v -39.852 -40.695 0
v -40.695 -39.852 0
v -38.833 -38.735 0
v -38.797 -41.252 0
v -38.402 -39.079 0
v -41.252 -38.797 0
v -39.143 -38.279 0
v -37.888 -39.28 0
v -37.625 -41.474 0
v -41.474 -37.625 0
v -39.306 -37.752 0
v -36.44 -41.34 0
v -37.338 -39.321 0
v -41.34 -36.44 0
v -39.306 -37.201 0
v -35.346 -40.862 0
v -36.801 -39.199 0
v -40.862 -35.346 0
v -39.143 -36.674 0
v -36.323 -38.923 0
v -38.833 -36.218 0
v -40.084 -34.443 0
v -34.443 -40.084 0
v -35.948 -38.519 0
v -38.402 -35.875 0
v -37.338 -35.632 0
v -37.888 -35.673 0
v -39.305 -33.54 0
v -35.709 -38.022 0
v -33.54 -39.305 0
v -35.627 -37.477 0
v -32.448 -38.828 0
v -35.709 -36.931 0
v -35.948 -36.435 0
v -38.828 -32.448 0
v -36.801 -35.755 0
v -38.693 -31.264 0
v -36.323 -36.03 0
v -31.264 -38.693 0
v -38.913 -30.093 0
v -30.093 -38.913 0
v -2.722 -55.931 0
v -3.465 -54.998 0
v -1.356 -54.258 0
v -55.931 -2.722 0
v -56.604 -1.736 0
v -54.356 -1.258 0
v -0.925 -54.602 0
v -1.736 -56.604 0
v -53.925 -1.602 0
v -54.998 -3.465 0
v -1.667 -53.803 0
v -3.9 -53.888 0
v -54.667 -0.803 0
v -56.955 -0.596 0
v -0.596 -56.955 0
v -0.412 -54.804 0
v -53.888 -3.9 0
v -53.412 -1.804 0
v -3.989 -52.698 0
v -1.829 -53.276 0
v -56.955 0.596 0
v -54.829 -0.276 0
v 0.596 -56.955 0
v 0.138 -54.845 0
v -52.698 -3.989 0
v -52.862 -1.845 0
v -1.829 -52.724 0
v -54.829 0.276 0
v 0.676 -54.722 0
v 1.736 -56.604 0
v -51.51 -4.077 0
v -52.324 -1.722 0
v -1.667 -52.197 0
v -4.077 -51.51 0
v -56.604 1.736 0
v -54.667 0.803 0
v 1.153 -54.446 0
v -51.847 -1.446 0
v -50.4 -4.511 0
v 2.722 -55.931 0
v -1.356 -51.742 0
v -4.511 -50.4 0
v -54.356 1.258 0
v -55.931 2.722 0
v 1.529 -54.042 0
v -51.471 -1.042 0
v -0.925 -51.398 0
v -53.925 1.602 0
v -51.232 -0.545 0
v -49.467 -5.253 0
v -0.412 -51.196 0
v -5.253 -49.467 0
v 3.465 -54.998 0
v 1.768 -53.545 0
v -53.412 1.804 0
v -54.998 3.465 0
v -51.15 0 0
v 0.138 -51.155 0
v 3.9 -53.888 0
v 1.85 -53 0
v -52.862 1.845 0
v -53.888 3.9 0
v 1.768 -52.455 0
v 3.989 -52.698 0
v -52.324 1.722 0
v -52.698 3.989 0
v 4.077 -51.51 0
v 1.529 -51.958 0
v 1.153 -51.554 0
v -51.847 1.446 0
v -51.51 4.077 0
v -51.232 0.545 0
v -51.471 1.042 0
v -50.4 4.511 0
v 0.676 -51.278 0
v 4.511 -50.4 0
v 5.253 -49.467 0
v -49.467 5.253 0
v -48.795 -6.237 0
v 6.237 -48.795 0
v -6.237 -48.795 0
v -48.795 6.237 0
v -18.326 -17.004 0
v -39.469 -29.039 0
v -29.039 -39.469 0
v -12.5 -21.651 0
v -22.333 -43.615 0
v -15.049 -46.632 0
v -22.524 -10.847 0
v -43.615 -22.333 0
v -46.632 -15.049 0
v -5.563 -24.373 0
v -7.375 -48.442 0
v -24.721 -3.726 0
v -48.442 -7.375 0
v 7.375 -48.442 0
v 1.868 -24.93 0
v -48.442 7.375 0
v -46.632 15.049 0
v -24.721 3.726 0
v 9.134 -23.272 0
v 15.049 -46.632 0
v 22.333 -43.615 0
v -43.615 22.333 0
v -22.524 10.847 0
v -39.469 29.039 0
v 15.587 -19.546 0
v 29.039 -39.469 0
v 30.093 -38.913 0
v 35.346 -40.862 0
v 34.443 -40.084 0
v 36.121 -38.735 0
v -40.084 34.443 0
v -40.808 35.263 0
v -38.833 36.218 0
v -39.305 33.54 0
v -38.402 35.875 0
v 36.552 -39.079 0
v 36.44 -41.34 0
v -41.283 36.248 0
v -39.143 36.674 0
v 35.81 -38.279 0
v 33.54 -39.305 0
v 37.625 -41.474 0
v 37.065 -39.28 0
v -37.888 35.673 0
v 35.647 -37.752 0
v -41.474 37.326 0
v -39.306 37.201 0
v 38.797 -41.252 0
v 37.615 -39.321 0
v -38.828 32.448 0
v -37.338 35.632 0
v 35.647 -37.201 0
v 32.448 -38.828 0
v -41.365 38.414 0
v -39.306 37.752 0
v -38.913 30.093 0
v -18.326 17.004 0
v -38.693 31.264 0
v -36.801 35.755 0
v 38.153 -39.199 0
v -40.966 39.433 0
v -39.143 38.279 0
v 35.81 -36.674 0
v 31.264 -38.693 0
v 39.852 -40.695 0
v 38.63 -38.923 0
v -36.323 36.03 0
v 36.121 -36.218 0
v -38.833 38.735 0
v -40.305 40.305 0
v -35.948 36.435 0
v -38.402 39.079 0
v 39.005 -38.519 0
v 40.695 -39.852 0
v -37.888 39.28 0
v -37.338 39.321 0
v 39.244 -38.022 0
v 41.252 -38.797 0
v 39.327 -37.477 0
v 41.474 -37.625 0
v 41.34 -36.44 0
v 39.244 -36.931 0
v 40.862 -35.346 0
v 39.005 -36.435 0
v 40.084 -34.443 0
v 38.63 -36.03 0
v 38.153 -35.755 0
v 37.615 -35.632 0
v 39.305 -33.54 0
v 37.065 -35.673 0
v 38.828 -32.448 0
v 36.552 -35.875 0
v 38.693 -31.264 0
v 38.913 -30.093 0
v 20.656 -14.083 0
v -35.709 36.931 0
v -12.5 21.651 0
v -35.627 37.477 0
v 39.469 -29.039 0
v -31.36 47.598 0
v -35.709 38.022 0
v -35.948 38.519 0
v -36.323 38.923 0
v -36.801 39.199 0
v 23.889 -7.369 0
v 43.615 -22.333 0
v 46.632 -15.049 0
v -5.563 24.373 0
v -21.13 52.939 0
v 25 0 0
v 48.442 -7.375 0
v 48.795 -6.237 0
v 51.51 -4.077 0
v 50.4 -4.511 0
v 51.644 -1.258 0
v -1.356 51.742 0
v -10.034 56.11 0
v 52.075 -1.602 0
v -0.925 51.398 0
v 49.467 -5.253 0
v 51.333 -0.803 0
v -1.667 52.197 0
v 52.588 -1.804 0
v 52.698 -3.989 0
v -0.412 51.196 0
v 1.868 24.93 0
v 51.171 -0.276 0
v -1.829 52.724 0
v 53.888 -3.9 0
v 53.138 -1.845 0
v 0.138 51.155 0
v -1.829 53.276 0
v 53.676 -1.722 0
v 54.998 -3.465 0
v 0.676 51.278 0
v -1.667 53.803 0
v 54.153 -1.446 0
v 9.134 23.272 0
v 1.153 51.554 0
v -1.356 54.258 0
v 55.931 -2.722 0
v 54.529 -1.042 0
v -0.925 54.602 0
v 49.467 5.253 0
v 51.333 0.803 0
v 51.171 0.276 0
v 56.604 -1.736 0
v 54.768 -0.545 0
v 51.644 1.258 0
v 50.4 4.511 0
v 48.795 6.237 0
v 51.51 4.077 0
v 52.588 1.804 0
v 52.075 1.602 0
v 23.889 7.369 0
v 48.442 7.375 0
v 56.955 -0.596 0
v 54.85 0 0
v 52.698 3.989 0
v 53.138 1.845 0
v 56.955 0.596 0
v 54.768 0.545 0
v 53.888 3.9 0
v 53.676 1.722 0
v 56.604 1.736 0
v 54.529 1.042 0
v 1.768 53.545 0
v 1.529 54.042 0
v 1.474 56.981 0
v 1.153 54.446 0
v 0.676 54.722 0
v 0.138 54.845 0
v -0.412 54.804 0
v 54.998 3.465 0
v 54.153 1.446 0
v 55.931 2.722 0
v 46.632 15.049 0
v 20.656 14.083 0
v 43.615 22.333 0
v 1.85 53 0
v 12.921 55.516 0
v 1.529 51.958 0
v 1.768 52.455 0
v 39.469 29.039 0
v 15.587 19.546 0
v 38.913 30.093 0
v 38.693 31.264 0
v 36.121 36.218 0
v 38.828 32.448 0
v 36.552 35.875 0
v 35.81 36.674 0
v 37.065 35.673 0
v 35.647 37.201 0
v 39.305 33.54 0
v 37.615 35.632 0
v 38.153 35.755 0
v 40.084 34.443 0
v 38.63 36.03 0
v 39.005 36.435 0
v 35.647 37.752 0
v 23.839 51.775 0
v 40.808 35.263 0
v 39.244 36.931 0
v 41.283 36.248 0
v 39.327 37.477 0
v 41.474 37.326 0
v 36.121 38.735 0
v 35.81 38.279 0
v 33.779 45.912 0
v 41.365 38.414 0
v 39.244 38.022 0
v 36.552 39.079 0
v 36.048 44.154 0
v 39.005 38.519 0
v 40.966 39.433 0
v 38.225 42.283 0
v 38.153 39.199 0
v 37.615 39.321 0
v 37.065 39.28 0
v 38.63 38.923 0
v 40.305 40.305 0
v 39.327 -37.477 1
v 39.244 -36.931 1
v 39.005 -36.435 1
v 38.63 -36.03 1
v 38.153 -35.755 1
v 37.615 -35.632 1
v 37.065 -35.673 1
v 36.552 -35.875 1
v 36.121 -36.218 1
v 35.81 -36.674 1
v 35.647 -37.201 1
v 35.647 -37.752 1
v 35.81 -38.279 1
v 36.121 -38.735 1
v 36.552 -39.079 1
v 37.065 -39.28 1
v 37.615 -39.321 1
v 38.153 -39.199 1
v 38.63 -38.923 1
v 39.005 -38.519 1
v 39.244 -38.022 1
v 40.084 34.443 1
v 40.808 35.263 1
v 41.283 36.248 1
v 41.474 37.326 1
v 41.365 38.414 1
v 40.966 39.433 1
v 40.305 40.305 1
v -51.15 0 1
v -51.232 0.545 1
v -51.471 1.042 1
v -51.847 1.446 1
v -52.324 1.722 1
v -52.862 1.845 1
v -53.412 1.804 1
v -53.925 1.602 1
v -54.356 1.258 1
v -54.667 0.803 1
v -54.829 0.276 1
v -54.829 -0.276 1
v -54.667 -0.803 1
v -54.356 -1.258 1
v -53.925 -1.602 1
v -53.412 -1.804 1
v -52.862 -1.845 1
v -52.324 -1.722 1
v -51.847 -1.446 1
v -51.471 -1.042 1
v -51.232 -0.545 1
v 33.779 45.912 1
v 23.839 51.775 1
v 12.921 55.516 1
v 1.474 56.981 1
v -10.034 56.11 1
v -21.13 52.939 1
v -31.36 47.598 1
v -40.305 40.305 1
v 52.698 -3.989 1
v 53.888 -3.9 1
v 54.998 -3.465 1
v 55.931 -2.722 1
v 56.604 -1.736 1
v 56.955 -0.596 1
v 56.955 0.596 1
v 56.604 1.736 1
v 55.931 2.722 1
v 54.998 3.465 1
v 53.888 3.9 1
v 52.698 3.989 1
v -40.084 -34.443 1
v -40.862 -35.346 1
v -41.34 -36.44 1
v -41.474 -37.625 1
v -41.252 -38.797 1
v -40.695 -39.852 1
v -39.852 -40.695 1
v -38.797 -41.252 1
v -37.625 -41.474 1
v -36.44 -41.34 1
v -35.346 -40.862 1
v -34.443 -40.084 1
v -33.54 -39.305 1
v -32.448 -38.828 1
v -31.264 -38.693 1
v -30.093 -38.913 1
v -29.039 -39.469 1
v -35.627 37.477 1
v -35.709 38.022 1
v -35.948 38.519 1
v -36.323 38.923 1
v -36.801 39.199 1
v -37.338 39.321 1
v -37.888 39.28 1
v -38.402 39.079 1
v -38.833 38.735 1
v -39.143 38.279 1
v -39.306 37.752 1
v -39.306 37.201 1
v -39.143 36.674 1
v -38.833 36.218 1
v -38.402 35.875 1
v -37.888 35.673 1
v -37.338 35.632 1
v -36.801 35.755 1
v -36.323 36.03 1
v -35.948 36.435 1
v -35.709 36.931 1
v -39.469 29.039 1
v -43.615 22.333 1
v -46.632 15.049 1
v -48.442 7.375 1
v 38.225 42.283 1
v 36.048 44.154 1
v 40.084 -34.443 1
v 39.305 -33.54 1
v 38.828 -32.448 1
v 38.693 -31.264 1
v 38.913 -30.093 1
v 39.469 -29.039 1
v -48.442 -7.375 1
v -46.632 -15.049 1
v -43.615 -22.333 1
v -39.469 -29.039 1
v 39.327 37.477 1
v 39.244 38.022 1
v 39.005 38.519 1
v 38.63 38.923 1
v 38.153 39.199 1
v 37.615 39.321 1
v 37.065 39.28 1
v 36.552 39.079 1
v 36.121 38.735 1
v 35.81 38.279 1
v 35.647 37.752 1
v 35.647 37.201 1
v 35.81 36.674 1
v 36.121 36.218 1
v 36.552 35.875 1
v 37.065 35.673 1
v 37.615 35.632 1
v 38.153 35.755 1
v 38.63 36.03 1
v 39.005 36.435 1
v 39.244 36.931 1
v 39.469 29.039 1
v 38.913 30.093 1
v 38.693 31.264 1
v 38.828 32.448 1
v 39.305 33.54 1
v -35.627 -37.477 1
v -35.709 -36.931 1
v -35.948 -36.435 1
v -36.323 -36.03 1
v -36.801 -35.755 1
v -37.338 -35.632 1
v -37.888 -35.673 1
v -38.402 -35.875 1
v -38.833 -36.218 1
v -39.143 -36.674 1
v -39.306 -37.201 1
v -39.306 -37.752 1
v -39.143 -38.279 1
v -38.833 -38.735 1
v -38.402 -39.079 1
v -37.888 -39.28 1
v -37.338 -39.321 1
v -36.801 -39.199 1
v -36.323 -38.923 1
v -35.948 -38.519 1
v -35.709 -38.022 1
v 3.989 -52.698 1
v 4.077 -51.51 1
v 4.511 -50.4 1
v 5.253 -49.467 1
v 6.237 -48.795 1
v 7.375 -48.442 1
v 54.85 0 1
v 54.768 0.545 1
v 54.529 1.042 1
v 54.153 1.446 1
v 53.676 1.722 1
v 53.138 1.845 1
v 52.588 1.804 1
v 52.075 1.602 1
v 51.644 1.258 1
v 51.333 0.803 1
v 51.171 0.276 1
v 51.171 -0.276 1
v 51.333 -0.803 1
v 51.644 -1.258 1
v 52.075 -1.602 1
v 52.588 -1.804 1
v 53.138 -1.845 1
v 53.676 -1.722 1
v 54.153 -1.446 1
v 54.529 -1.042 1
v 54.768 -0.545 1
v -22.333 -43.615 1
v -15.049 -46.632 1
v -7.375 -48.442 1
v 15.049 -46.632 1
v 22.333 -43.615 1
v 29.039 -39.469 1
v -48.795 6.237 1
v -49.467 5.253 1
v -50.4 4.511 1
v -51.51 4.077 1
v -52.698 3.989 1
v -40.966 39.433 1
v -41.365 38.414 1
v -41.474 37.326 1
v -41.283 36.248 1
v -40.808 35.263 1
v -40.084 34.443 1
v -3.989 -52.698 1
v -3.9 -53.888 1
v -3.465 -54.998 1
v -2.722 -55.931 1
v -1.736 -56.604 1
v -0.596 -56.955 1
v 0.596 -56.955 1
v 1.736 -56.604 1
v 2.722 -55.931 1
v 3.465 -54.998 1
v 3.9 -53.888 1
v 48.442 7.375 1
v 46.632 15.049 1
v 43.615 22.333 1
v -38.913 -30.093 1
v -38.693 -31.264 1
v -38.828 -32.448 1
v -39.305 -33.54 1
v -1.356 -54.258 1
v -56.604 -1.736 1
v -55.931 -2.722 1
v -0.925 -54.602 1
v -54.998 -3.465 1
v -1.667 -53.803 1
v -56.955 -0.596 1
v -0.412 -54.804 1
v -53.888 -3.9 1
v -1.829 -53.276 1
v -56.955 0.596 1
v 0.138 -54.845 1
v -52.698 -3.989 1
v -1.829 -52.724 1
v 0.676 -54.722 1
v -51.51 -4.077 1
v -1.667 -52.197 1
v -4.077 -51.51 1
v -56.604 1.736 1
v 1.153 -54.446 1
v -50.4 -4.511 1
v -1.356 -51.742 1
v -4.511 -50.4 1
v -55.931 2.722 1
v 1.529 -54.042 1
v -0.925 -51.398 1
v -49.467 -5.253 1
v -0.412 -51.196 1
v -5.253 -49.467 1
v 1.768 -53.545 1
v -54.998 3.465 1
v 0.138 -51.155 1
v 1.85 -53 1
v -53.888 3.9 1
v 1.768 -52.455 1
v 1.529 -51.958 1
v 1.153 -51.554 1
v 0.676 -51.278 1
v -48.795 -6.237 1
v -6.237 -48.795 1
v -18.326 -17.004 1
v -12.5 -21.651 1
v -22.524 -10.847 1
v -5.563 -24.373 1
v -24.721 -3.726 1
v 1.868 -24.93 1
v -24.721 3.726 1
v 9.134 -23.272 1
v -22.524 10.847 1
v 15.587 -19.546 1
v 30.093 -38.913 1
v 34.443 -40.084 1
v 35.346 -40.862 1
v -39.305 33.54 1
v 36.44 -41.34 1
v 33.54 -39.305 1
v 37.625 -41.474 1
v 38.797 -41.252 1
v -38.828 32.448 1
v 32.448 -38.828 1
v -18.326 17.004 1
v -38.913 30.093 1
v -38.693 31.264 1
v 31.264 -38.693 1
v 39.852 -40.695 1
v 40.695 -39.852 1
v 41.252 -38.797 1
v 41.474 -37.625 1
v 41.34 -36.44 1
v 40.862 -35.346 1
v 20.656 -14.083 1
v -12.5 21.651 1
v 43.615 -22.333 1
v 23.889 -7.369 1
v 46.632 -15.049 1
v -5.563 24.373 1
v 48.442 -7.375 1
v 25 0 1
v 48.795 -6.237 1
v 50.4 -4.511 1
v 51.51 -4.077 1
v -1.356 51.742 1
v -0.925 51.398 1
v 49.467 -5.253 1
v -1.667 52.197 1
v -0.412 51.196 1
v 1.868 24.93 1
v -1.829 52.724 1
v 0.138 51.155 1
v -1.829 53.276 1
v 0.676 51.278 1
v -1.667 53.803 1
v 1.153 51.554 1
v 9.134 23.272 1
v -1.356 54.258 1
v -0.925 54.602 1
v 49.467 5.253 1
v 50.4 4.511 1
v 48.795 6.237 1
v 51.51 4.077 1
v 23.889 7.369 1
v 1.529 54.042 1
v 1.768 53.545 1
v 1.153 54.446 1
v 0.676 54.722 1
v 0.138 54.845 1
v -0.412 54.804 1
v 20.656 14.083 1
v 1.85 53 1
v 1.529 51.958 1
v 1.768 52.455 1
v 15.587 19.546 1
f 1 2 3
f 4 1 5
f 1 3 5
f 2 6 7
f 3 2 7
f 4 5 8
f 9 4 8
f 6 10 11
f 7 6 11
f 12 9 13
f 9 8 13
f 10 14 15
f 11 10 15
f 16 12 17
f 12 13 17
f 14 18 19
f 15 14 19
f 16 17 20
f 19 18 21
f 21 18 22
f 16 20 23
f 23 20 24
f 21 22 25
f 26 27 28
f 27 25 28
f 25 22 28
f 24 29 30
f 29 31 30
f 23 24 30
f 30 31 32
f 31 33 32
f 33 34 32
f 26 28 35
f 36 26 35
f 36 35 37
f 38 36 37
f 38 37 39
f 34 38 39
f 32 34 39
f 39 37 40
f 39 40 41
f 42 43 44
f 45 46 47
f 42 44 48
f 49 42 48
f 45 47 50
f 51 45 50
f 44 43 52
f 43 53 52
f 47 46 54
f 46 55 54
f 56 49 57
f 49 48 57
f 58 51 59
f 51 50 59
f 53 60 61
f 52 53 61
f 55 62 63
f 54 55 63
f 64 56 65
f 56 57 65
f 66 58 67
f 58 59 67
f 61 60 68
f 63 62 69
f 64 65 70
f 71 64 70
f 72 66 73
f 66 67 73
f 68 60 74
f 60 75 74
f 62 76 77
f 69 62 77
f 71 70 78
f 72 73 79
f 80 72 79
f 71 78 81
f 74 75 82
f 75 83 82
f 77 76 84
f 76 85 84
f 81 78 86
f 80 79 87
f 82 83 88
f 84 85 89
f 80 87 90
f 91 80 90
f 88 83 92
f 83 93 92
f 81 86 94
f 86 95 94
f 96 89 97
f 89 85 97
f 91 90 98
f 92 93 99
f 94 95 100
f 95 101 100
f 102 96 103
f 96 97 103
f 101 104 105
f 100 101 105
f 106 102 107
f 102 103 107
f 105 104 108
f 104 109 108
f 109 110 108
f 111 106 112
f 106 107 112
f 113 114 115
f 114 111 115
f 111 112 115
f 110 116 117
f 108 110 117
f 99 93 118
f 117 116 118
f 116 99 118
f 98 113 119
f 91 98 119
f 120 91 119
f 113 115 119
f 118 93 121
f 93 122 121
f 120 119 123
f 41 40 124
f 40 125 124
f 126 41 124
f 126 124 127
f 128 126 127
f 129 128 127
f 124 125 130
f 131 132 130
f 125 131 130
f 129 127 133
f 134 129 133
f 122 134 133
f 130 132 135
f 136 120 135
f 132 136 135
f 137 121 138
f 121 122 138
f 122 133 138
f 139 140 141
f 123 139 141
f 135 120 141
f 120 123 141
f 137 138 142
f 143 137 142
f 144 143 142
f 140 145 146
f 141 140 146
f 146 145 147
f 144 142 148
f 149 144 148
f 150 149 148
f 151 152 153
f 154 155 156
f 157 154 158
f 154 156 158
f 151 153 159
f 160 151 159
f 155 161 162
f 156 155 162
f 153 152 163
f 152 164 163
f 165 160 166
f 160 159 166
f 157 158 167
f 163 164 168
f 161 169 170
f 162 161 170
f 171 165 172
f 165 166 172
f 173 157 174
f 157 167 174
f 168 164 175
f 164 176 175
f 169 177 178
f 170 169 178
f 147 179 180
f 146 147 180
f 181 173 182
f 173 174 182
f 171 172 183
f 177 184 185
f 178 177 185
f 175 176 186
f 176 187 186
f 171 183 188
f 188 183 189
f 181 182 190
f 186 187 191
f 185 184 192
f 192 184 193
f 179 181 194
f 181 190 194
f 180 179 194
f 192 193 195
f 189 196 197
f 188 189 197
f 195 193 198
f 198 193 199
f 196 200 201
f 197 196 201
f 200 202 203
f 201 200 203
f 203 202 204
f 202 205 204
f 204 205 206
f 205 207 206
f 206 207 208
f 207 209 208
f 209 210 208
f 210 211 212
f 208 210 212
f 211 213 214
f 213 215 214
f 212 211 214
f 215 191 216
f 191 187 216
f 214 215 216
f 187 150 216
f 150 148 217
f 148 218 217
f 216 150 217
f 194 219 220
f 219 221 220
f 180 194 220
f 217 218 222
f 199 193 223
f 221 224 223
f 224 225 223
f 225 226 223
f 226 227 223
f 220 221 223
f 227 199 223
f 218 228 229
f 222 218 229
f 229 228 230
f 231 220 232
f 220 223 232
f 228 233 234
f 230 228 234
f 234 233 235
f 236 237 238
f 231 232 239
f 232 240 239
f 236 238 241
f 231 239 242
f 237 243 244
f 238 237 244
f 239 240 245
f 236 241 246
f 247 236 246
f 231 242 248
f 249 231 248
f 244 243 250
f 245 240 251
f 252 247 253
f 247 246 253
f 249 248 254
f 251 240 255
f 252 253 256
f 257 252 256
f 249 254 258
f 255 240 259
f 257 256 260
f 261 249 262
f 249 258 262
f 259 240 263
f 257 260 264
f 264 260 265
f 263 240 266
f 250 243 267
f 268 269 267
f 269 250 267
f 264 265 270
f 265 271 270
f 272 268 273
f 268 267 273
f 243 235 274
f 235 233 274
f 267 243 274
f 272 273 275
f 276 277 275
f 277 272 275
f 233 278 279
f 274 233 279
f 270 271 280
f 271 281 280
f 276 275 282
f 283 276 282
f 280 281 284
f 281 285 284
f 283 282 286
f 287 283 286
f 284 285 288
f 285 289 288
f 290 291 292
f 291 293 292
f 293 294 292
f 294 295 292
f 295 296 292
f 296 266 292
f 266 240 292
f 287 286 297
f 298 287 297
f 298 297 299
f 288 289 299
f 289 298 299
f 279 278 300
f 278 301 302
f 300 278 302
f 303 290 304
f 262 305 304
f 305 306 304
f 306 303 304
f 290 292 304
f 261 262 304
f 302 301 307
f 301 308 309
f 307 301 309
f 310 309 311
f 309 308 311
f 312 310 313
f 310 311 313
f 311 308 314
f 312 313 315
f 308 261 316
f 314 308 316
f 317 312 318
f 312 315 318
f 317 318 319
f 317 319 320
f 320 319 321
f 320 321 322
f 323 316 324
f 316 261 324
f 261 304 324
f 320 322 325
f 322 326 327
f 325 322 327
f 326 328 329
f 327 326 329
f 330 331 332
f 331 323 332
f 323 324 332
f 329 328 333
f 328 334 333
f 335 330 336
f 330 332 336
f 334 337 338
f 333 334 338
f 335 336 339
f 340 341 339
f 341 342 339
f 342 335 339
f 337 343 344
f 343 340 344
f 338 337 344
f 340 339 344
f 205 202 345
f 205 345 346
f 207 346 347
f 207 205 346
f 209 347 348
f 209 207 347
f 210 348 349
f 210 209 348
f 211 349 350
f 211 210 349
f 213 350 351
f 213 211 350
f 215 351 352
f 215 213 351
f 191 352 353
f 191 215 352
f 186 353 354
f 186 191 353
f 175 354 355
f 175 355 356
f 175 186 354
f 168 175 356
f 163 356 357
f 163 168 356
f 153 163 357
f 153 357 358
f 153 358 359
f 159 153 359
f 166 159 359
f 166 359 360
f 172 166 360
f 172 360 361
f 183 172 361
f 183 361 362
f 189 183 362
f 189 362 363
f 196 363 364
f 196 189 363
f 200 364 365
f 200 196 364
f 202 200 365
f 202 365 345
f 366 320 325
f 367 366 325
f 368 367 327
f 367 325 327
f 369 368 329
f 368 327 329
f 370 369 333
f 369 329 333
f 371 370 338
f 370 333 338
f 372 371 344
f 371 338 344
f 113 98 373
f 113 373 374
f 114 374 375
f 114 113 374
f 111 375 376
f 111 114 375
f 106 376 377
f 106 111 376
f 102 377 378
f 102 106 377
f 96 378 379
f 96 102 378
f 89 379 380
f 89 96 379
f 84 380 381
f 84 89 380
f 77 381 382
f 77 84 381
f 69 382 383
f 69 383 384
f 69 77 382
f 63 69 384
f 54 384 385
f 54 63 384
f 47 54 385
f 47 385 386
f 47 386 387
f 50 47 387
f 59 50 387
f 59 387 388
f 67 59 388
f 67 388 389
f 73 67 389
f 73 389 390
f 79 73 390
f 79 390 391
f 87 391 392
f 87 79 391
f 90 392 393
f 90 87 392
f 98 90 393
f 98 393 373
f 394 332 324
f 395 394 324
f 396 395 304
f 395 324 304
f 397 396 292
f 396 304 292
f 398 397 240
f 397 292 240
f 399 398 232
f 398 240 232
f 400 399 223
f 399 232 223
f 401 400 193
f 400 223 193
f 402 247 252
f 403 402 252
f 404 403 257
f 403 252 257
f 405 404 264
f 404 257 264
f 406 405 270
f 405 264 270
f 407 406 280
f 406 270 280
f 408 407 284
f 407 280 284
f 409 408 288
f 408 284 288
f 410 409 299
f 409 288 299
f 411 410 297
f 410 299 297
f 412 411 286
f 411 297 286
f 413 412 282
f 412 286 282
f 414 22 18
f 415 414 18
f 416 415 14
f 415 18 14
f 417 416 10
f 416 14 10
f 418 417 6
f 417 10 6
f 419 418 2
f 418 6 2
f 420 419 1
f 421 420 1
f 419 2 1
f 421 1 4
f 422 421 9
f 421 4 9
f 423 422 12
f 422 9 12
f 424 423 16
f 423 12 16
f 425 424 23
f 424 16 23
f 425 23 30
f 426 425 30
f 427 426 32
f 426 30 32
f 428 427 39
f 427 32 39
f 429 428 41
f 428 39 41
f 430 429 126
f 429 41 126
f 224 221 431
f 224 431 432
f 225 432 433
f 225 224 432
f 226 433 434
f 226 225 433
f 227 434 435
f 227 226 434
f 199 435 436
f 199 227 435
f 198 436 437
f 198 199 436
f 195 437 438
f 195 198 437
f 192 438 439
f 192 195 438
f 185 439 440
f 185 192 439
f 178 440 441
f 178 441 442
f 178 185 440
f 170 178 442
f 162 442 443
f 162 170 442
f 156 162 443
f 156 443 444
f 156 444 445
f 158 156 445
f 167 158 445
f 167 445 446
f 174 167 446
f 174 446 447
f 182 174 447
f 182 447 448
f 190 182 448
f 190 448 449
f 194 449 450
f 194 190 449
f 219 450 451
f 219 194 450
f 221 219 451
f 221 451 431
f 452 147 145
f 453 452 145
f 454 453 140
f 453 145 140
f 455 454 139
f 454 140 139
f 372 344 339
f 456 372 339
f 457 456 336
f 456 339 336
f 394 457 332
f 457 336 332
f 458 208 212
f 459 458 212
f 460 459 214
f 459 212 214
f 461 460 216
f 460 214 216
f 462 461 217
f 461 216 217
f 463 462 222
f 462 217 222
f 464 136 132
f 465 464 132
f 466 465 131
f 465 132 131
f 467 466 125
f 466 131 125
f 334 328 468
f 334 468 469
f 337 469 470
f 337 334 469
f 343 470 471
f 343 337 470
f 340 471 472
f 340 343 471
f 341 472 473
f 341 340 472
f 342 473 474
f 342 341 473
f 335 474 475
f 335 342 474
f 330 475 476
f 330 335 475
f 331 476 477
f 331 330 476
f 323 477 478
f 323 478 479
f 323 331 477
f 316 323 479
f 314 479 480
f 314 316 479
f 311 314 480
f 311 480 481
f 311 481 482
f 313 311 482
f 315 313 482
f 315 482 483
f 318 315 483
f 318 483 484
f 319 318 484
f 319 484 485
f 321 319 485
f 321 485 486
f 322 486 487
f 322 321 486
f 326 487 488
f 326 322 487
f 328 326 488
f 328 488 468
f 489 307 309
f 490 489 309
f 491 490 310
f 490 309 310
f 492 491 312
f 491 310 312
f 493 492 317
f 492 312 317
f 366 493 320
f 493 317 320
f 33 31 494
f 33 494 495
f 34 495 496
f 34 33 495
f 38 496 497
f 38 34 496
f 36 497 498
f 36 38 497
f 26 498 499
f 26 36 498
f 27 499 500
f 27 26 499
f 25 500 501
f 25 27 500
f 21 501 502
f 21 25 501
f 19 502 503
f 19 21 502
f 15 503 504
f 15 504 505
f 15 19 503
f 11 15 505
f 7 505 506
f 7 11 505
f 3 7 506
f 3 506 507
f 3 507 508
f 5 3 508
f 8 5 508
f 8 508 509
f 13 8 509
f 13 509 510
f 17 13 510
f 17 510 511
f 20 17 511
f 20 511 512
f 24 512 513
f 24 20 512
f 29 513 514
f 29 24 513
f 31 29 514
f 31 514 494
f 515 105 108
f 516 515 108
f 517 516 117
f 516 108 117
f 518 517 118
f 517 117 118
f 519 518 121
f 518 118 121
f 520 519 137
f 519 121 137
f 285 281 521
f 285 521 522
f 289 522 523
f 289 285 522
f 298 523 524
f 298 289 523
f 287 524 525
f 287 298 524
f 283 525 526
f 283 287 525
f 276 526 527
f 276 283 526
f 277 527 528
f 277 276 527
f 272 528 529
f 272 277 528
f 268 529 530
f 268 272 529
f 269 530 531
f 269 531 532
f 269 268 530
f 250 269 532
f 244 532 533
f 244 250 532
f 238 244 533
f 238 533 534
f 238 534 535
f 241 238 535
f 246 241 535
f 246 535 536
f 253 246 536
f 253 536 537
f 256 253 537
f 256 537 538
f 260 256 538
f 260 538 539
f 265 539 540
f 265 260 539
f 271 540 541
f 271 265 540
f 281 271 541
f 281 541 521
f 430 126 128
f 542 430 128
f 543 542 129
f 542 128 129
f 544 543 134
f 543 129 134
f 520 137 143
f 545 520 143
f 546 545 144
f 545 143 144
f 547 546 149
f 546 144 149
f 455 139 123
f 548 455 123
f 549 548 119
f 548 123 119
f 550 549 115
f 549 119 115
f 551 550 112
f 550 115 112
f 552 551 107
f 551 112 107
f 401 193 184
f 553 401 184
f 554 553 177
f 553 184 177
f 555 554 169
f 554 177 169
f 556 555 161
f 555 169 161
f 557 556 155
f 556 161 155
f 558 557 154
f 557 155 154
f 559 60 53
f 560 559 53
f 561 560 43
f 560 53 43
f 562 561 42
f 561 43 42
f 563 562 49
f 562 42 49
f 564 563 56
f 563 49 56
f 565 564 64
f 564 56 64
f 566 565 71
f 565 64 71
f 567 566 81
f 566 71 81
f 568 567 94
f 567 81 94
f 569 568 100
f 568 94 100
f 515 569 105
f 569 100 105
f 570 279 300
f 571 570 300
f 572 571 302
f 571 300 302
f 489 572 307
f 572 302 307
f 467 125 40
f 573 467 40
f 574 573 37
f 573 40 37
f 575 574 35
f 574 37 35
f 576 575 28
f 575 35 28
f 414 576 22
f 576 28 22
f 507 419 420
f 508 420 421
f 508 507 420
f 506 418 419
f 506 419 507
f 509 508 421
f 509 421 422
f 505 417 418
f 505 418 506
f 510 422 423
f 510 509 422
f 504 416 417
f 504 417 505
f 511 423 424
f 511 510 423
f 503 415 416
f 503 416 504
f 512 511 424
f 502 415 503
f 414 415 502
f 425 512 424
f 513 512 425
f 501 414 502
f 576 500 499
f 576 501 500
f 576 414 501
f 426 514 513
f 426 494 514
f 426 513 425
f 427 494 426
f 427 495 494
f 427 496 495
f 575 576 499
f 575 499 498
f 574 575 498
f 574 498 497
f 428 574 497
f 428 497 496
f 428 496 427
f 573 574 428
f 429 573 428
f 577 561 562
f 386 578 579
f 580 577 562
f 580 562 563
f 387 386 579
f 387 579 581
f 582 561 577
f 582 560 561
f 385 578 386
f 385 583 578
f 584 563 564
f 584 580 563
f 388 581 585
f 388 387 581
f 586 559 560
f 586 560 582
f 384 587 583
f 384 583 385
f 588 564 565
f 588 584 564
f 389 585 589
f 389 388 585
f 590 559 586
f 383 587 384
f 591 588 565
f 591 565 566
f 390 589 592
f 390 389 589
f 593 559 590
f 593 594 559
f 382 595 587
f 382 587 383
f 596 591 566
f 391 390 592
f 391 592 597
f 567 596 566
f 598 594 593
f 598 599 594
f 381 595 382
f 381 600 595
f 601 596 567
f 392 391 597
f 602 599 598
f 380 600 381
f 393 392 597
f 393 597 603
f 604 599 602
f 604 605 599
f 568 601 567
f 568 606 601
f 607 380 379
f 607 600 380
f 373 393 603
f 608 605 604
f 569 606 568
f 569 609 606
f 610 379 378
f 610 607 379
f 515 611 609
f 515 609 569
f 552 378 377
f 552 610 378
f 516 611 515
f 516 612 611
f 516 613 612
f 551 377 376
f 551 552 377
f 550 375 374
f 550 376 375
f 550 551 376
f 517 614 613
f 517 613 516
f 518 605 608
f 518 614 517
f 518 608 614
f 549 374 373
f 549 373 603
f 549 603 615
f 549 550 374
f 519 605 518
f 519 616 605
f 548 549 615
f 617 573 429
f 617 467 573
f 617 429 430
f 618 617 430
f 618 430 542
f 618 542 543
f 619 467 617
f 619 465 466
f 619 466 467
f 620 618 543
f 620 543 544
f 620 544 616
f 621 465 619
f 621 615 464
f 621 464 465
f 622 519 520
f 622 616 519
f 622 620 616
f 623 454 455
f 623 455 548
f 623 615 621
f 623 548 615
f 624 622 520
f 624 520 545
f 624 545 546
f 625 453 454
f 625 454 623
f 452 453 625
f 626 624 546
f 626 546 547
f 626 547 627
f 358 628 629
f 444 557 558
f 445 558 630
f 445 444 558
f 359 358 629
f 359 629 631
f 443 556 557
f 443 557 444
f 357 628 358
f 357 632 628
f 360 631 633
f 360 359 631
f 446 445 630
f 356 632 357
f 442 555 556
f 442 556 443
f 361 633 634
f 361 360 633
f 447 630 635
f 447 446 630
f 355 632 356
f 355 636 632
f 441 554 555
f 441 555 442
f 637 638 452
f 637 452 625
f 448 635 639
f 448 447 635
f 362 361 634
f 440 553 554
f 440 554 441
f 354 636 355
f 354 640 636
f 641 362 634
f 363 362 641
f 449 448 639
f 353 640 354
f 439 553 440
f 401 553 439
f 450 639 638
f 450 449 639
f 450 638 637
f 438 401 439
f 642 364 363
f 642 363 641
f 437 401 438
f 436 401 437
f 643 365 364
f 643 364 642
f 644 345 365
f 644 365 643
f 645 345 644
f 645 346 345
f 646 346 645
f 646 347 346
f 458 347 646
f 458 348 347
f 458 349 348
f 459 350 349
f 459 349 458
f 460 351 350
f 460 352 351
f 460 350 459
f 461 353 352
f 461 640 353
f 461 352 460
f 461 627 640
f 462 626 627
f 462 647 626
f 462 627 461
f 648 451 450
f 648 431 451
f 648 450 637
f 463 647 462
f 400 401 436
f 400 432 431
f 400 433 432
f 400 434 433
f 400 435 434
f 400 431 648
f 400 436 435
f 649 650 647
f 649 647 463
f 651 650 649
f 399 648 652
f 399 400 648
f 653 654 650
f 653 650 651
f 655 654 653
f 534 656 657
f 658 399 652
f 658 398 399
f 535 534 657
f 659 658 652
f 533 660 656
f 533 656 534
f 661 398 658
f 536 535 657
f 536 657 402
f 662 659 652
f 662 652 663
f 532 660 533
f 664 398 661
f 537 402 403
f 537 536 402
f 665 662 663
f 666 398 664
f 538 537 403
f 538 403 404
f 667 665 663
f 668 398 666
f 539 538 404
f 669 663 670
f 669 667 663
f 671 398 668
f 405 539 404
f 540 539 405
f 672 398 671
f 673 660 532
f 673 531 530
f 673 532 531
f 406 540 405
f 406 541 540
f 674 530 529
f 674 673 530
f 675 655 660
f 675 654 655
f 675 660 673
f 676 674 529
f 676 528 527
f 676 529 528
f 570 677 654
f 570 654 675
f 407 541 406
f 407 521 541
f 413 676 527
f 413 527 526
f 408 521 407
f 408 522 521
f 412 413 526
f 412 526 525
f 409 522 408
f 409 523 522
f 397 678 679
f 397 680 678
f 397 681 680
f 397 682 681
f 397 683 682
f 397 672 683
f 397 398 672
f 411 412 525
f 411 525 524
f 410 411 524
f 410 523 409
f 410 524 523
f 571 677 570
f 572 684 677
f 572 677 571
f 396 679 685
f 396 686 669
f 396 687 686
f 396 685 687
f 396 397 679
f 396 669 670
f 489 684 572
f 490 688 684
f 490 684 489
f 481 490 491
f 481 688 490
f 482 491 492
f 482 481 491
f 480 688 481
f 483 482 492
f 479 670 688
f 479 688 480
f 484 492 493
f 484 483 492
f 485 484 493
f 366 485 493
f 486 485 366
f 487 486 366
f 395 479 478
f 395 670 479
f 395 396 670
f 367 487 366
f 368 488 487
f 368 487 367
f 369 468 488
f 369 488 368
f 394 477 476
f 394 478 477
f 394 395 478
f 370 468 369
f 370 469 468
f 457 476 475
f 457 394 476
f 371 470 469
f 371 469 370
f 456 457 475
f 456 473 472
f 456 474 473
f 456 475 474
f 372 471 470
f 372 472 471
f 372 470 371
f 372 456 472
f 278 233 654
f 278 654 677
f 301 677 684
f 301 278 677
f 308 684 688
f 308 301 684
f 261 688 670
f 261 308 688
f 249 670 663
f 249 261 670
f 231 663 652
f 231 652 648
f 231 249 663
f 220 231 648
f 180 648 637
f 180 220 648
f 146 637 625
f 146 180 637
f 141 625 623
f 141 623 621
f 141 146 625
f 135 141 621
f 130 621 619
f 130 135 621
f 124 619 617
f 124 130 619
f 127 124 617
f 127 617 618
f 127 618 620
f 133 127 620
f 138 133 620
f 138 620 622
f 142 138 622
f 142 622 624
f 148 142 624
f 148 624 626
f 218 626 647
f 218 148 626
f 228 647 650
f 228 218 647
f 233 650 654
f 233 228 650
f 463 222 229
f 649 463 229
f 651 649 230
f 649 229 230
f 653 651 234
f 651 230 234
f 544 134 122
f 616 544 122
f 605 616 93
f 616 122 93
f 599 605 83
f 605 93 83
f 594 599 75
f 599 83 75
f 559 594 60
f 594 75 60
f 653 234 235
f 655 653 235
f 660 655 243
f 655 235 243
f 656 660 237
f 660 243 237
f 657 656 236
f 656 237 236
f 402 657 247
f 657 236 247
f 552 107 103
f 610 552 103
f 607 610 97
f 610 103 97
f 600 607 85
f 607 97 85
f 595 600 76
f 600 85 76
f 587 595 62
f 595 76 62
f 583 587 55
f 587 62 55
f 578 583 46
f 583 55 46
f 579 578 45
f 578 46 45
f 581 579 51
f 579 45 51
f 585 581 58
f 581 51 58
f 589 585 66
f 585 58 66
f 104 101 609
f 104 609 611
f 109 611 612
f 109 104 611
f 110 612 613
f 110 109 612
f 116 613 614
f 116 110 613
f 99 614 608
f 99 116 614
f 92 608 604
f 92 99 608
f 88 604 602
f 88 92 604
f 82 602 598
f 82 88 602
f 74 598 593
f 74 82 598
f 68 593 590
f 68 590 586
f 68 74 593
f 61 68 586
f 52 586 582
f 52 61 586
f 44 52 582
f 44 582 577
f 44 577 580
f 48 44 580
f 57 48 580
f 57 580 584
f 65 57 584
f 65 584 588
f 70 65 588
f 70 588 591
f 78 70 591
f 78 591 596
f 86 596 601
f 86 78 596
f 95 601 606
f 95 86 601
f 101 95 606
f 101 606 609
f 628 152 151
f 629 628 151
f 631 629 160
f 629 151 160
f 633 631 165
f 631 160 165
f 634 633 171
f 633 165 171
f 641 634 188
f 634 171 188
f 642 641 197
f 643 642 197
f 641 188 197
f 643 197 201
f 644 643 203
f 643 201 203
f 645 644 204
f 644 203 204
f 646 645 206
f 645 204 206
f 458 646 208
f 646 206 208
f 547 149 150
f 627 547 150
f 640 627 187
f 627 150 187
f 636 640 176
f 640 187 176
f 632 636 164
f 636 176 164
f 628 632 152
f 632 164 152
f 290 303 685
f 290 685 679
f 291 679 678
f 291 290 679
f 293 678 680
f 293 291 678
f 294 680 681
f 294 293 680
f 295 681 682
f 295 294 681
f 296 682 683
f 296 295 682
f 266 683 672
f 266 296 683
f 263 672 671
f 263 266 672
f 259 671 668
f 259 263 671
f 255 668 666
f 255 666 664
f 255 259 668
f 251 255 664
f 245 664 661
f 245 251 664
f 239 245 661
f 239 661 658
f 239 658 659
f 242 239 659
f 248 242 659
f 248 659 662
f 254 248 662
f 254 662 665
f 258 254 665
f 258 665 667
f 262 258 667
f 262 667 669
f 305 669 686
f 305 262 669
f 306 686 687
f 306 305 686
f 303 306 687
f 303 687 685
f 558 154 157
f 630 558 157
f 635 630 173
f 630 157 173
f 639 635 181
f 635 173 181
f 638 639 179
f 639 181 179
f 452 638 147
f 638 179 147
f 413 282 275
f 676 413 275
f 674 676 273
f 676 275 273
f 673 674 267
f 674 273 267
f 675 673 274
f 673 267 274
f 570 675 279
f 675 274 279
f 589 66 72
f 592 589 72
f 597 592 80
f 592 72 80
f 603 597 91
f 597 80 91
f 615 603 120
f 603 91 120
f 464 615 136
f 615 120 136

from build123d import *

# Parameters (mm, degrees)
NPTH_R              = 1.85
NPTH_R_2            = 25
BOSS_EXTRUDE1_DEPTH = 1


with BuildPart() as part:
    # NPTH → Boss-Extrude1 (new body)
    with BuildSketch(Plane.XY):
        with BuildLine():
            ThreePointArc((33.779497471, 45.912368166), (-4.301886792, 56.837432824), (-40.305086528, 40.305086528))
            ThreePointArc((-40.305086528, 40.305086528), (-41.47380633, 37.325608267), (-40.083553498, 34.442832912))
            ThreePointArc((-40.083553498, 34.442832912), (-38.716100837, 31.861298217), (-39.46852702, 29.03851537))
            ThreePointArc((-39.46852702, 29.03851537), (-45.270097093, 18.751488186), (-48.441794233, 7.375131965))
            ThreePointArc((-48.441794233, 7.375131965), (-49.90575747, 4.847077417), (-52.698113208, 3.988591777))
            ThreePointArc((-52.698113208, 3.988591777), (-57, 0), (-52.698113208, -3.988591777))
            ThreePointArc((-52.698113208, -3.988591777), (-49.90575747, -4.847077417), (-48.441794233, -7.375131965))
            ThreePointArc((-48.441794233, -7.375131965), (-45.270097093, -18.751488186), (-39.46852702, -29.03851537))
            ThreePointArc((-39.46852702, -29.03851537), (-38.716100837, -31.861298217), (-40.083553498, -34.442832912))
            ThreePointArc((-40.083553498, -34.442832912), (-40.305086528, -40.305086528), (-34.442832912, -40.083553498))
            ThreePointArc((-34.442832912, -40.083553498), (-31.861298217, -38.716100837), (-29.03851537, -39.46852702))
            ThreePointArc((-29.03851537, -39.46852702), (-18.751488186, -45.270097093), (-7.375131965, -48.441794233))
            ThreePointArc((-7.375131965, -48.441794233), (-4.847077417, -49.90575747), (-3.988591777, -52.698113208))
            ThreePointArc((-3.988591777, -52.698113208), (0, -57), (3.988591777, -52.698113208))
            ThreePointArc((3.988591777, -52.698113208), (4.847077417, -49.90575747), (7.375131965, -48.441794233))
            ThreePointArc((7.375131965, -48.441794233), (18.751488186, -45.270097093), (29.03851537, -39.46852702))
            ThreePointArc((29.03851537, -39.46852702), (31.861298217, -38.716100837), (34.442832912, -40.083553498))
            ThreePointArc((34.442832912, -40.083553498), (40.305086528, -40.305086528), (40.083553498, -34.442832912))
            ThreePointArc((40.083553498, -34.442832912), (38.716100837, -31.861298217), (39.46852702, -29.03851537))
            ThreePointArc((39.46852702, -29.03851537), (45.270097093, -18.751488186), (48.441794233, -7.375131965))
            ThreePointArc((48.441794233, -7.375131965), (49.90575747, -4.847077417), (52.698113208, -3.988591777))
            ThreePointArc((52.698113208, -3.988591777), (57, 0), (52.698113208, 3.988591777))
            ThreePointArc((52.698113208, 3.988591777), (49.90575747, 4.847077417), (48.441794233, 7.375131965))
            ThreePointArc((48.441794233, 7.375131965), (45.270097093, 18.751488186), (39.46852702, 29.03851537))
            ThreePointArc((39.46852702, 29.03851537), (38.716100837, 31.861298217), (40.083553498, 34.442832912))
            ThreePointArc((40.083553498, 34.442832912), (41.47380633, 37.325608267), (40.305086528, 40.305086528))
            ThreePointArc((40.305086528, 40.305086528), (37.148240852, 43.232027498), (33.779497471, 45.912368166))
        make_face()
        with Locations((-37.476659403, -37.476659403)):
            Circle(NPTH_R, mode=Mode.SUBTRACT)
        with Locations((-53, 0)):
            Circle(NPTH_R, mode=Mode.SUBTRACT)
        with Locations((0, -53)):
            Circle(NPTH_R, mode=Mode.SUBTRACT)
        with Locations((37.476659403, -37.476659403)):
            Circle(NPTH_R, mode=Mode.SUBTRACT)
        Circle(NPTH_R_2, mode=Mode.SUBTRACT)
        with Locations((53, 0)):
            Circle(NPTH_R, mode=Mode.SUBTRACT)
        with Locations((-37.476659403, 37.476659403)):
            Circle(NPTH_R, mode=Mode.SUBTRACT)
        with Locations((0, 53)):
            Circle(NPTH_R, mode=Mode.SUBTRACT)
        with Locations((37.476659403, 37.476659403)):
            Circle(NPTH_R, mode=Mode.SUBTRACT)
    extrude(amount=BOSS_EXTRUDE1_DEPTH)


solid = part.part
